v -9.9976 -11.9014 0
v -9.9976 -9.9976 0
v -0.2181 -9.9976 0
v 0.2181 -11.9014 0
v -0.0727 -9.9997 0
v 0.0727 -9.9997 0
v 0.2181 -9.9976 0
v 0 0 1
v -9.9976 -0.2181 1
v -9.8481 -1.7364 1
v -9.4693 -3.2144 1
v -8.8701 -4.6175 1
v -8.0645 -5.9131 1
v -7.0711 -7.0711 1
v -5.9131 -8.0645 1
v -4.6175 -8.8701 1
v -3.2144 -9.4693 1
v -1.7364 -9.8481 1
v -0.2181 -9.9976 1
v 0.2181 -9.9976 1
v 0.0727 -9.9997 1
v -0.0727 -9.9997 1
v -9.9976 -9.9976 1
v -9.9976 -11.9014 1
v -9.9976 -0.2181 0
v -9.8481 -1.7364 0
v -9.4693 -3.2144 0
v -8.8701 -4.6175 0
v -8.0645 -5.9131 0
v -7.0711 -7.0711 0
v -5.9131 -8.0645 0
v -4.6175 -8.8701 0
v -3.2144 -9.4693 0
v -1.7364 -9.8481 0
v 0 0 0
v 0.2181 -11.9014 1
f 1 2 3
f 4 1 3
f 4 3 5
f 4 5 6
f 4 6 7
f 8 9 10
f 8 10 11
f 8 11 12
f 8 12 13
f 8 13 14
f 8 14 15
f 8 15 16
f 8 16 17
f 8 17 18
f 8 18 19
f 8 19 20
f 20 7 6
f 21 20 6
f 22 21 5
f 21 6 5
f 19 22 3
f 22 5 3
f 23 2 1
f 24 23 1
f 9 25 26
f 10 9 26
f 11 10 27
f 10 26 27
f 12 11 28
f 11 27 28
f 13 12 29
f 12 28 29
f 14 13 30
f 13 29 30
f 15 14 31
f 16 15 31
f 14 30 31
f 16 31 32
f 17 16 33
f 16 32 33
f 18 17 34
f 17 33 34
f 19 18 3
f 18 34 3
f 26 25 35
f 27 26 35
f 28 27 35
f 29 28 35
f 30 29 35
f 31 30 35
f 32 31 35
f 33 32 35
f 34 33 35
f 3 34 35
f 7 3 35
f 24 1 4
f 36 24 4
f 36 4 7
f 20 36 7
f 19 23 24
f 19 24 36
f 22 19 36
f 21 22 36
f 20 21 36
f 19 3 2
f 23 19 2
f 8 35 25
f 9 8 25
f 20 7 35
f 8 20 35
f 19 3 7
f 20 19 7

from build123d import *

# Parameters (mm, degrees)
EXTRUDE_1_DEPTH   = 1
EXTRUDE_1_2_DEPTH = 1


with BuildPart() as part:
    # ｽｹｯﾁ1 → ﾎﾞｽ - 押し出し1 (new body)
    with BuildSketch(Plane.XY):
        with BuildLine():
            Line((0, 0), (-9.997621528, -0.218091207))
            ThreePointArc((-9.997621528, -0.218091207), (-7.071067812, -7.071067812), (-0.218091207, -9.997621528))
            Line((-0.218091207, -9.997621528), (0.218091207, -9.997621528))
            Line((0.218091207, -9.997621528), (0, 0))
        make_face()
    extrude(amount=EXTRUDE_1_DEPTH)


with BuildPart() as body_2:
    # ｽｹｯﾁ1 → Extrude 1 2 (new body)
    with BuildSketch(Plane.XY):
        with BuildLine():
            ThreePointArc((0.218091207, -9.997621528), (0, -10), (-0.218091207, -9.997621528))
            Line((-0.218091207, -9.997621528), (-9.997621528, -9.997621528))
            Line((-9.997621528, -9.997621528), (-9.997621528, -11.901425508))
            Line((-9.997621528, -11.901425508), (0.218091207, -11.901425508))
            Line((0.218091207, -11.901425508), (0.218091207, -9.997621528))
        make_face()
    extrude(amount=EXTRUDE_1_2_DEPTH)


solid = Compound([part.part, body_2.part])
